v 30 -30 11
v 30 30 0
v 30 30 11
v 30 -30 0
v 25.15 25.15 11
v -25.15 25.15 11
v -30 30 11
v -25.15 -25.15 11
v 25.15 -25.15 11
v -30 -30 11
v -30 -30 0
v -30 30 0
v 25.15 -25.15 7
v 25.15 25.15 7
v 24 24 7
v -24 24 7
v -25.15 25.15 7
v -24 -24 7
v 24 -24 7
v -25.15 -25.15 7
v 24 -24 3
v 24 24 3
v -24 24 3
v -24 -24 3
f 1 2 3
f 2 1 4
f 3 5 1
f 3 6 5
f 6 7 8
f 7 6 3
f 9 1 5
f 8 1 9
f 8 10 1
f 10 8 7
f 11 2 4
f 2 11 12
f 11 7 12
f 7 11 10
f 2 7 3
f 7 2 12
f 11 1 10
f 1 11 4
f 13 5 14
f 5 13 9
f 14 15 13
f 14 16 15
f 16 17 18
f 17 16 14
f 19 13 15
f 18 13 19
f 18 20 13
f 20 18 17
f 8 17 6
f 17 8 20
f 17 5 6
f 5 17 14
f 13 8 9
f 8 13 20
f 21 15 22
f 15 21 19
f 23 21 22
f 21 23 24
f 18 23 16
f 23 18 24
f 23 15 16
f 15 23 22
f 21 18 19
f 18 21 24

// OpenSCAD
part = "both"; // [first:Mold Only,second:Stencil Only,both:Mold and Stencil]

/* [Parameters] */
// Load a 100x100 pixel image. (images will be automatically stretched to fit) Simple, high contrast images like logos work best.
Image = "image-surface.dat"; // [image_surface:100x100]
//Length of the sides of the square actuator
Side_Length = 50; //[1:100]
//Thickness of the first layer of silicone (Having different thicknesses on the layer will create varying effects)
Layer_1_Height = 4; //[1:4]
//Thickness of the second layer of silicone (Having different thicknesses on the layer will create varying effects)
Layer_2_Height = 4; //[1:4]

/* [Hidden] */
height = Layer_2_Height;
tolerance = .3;
thickness = height*2;
scaleFactor = Side_Length/100;
Layer_1_Height_2 = Layer_1_Height;
Layer_2_Height_2 = Layer_2_Height;

print_part();

module print_part() {
	if (part == "first") {
		mold();
	} else if (part == "second") {
		stencil();
	} else if (part == "both") {
		both();
	} else {
		both();
	}
}

module both() {
    mold();
    stencil();
}


module stencil() {
    translate([0,0,Layer_1_Height+Layer_2_Height+23]) {

        scale([scaleFactor,scaleFactor,1]) {
            difference() {
                scale([1.01,1.01,thickness]) {
                    surface(file=Image, center=true, convexity=5);
                }
 
                translate([0,0,-(height)]) {
                    cube([135,135,2*thickness],center=true);
                }
            }
        }
    }
}


module mold() {
    difference() {
        difference() {
            translate([0,0,(Layer_1_Height+Layer_2_Height+3)/2]) {
                cube([Side_Length+10,Side_Length+10,Layer_1_Height+Layer_2_Height+3], center = true);
            }
            translate([0,0,Layer_1_Height+3]) {
                translate([0,0,(Layer_2_Height_2)/2]) {
                    cube([Side_Length+tolerance,Side_Length+tolerance,Layer_2_Height_2], center = true);
                }
            }
        }

        translate([0,0,3]) {
            translate([0,0,(Layer_1_Height_2)/2]) {
                cube([Side_Length-2,Side_Length-2,Layer_1_Height_2], center = true);
            }
        }
    }
}
